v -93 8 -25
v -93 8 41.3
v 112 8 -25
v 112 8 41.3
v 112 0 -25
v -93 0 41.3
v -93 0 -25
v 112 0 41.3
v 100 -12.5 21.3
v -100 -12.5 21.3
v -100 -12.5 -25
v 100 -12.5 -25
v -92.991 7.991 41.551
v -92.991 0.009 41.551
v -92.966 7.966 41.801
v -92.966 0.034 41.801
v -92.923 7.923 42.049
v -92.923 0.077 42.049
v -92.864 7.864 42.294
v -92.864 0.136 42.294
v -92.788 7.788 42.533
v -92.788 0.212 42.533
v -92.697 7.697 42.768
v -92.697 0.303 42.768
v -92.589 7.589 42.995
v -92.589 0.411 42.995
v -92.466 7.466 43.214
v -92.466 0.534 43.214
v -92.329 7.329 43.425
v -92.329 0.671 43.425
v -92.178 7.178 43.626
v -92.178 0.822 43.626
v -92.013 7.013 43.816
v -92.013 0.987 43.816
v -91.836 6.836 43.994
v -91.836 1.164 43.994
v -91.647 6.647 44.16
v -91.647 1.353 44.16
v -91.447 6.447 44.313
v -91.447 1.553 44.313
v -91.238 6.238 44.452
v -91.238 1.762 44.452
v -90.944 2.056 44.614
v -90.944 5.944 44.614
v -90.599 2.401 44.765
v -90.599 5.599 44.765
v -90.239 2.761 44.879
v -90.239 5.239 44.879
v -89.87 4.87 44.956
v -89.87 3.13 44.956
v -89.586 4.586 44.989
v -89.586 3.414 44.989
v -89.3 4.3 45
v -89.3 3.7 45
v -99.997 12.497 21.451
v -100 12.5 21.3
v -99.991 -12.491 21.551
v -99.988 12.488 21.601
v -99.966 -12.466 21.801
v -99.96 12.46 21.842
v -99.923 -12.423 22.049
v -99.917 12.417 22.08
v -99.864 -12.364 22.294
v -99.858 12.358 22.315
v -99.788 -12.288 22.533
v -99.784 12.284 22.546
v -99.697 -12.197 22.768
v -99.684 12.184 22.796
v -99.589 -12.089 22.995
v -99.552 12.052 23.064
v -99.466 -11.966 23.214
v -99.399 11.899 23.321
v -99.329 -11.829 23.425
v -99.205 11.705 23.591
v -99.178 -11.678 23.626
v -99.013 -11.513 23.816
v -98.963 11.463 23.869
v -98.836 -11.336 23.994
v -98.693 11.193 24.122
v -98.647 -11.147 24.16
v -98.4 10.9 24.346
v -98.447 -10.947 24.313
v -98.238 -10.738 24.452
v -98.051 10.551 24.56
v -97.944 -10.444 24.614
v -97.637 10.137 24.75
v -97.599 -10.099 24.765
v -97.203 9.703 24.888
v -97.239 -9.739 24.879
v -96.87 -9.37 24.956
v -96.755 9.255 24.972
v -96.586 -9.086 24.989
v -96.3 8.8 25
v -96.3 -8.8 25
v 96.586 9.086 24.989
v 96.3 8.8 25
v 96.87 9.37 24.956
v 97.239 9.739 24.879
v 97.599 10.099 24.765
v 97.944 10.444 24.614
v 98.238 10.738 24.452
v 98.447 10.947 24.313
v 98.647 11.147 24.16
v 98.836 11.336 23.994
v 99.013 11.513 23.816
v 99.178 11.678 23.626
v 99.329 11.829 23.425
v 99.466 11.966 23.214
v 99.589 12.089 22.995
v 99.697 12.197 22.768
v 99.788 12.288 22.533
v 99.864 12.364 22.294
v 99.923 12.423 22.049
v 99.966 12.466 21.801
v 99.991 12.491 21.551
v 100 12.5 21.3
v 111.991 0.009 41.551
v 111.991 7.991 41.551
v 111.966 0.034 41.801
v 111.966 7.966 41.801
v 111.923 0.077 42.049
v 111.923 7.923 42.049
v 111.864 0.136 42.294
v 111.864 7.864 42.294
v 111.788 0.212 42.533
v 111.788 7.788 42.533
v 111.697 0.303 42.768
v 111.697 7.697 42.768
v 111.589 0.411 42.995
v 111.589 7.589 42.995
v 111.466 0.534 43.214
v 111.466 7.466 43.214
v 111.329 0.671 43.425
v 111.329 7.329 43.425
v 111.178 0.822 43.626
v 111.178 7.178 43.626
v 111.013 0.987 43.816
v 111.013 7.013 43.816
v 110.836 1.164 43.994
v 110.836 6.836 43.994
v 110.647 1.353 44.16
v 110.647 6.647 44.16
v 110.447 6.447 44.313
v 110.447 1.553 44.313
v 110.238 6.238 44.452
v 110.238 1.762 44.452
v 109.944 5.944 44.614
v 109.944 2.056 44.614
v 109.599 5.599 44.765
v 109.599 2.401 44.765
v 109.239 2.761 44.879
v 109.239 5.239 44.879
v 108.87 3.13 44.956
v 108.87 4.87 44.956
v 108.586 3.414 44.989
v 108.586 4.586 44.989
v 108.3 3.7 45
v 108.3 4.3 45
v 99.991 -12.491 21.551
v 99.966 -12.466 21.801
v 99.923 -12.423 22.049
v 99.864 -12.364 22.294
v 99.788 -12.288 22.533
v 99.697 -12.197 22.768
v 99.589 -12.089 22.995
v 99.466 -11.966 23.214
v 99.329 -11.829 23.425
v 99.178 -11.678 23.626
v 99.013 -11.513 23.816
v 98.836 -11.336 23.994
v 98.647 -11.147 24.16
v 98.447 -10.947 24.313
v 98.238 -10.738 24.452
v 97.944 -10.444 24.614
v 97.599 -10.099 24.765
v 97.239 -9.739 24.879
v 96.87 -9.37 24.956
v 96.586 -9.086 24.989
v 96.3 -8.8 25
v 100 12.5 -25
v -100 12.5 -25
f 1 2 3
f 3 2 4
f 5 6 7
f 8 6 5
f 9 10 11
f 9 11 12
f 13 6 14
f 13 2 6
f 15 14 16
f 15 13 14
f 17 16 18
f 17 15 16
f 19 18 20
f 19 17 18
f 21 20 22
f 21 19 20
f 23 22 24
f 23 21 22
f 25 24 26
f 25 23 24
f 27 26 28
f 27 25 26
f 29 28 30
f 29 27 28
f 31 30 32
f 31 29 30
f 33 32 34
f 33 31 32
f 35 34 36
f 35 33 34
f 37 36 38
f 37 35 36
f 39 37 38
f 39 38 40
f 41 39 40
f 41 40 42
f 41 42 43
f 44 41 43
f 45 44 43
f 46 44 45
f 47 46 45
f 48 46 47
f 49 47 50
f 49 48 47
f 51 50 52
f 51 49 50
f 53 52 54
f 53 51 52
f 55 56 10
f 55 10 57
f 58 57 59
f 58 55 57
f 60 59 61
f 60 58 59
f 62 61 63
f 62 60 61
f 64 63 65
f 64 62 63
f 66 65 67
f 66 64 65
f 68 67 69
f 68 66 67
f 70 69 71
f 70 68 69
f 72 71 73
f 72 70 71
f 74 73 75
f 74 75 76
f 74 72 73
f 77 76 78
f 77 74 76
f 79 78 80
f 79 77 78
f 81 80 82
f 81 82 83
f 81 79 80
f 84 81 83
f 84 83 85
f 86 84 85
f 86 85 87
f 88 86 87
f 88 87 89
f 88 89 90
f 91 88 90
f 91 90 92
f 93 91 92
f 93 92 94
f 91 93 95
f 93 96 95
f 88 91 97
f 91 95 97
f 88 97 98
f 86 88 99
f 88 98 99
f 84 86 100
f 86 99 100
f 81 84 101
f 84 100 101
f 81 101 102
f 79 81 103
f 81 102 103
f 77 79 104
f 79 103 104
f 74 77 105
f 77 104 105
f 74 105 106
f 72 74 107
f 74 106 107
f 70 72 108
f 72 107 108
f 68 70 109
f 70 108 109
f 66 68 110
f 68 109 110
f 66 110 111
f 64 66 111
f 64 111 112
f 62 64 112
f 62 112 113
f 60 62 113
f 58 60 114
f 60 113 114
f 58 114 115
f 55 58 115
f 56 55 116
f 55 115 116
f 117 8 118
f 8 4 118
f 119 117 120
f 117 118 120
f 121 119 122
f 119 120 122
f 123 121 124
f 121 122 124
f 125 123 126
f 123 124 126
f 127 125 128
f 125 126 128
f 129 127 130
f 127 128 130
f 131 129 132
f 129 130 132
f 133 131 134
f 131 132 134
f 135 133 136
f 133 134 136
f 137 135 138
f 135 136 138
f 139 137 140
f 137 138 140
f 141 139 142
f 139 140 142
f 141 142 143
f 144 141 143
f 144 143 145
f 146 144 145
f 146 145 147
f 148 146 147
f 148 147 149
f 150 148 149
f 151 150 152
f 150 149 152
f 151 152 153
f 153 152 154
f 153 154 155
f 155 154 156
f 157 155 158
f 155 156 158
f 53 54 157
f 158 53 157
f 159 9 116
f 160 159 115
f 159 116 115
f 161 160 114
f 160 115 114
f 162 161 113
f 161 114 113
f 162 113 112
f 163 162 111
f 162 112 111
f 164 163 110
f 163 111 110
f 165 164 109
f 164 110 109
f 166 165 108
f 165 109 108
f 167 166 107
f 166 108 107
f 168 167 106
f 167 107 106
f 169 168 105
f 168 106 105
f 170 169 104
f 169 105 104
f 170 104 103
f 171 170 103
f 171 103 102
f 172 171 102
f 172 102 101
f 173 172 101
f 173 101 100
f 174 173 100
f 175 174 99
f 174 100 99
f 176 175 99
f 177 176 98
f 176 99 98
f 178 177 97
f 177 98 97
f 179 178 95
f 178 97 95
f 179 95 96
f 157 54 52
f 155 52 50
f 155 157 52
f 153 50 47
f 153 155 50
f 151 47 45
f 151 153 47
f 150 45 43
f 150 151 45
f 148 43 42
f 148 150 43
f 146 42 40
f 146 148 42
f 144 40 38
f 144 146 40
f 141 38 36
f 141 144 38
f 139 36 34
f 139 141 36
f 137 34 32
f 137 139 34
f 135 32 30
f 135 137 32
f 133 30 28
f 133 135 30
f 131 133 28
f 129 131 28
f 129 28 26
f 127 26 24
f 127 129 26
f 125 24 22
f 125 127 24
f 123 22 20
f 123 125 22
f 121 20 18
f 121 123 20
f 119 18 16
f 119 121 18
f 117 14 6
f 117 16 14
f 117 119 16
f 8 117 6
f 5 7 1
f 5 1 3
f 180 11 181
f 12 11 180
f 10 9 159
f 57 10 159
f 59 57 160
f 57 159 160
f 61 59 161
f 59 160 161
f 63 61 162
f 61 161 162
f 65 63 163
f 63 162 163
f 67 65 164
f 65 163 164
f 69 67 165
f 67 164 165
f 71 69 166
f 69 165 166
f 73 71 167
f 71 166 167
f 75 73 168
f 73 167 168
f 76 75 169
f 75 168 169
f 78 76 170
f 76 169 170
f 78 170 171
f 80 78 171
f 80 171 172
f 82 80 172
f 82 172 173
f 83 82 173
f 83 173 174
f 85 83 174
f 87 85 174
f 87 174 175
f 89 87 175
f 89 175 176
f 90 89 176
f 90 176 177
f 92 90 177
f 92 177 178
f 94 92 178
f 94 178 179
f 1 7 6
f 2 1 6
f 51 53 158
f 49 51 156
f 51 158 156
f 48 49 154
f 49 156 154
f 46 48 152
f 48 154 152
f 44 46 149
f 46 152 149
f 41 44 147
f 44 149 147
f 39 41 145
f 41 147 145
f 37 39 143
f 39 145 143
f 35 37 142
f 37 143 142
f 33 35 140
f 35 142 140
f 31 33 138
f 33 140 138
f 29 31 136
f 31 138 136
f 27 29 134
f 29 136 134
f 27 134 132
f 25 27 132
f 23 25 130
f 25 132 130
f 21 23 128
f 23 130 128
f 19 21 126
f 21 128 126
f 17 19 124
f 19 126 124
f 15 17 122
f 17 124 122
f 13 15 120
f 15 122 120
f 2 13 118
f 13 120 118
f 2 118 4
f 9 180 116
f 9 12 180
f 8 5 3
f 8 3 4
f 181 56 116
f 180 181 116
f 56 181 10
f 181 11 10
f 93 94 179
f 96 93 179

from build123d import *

# Parameters (mm, degrees)
F0_W     = 200
F0_H     = 50
F1_DEPTH = 12.5
F2_W     = 205
F2_H     = 70
F3_DEPTH = 8
F4_R     = 3.7
F4_2_R   = 3.7


with BuildPart() as f1:
    # F0 (on Front) → F1 (new body, symmetric)
    with BuildSketch(Plane.XZ):
        Rectangle(F0_W, F0_H)
    extrude(amount=F1_DEPTH, both=True)

    # F4#2
    f4_2_edges = [f1.edges().sort_by_distance(p)[0] for p in [
        (100, 0, 25),
        (0, 12.5, 25),
        (-100, 0, 25),
        (0, -12.5, 25),
    ]]
    fillet(f4_2_edges, radius=F4_2_R)


with BuildPart() as f3:
    # F2 (on Front) → F3 (new body)
    with BuildSketch(Plane.XZ):
        with Locations((9.5, 10)):
            Rectangle(F2_W, F2_H)
    extrude(amount=-F3_DEPTH)

    # F4
    f4_edges = [f3.edges().sort_by_distance(p)[0] for p in [
        (112, 4, 45),
        (-93, 4, 45),
        (9.5, 0, 45),
        (9.5, 8, 45),
    ]]
    fillet(f4_edges, radius=F4_R)


solid = Compound([f1.part, f3.part])
